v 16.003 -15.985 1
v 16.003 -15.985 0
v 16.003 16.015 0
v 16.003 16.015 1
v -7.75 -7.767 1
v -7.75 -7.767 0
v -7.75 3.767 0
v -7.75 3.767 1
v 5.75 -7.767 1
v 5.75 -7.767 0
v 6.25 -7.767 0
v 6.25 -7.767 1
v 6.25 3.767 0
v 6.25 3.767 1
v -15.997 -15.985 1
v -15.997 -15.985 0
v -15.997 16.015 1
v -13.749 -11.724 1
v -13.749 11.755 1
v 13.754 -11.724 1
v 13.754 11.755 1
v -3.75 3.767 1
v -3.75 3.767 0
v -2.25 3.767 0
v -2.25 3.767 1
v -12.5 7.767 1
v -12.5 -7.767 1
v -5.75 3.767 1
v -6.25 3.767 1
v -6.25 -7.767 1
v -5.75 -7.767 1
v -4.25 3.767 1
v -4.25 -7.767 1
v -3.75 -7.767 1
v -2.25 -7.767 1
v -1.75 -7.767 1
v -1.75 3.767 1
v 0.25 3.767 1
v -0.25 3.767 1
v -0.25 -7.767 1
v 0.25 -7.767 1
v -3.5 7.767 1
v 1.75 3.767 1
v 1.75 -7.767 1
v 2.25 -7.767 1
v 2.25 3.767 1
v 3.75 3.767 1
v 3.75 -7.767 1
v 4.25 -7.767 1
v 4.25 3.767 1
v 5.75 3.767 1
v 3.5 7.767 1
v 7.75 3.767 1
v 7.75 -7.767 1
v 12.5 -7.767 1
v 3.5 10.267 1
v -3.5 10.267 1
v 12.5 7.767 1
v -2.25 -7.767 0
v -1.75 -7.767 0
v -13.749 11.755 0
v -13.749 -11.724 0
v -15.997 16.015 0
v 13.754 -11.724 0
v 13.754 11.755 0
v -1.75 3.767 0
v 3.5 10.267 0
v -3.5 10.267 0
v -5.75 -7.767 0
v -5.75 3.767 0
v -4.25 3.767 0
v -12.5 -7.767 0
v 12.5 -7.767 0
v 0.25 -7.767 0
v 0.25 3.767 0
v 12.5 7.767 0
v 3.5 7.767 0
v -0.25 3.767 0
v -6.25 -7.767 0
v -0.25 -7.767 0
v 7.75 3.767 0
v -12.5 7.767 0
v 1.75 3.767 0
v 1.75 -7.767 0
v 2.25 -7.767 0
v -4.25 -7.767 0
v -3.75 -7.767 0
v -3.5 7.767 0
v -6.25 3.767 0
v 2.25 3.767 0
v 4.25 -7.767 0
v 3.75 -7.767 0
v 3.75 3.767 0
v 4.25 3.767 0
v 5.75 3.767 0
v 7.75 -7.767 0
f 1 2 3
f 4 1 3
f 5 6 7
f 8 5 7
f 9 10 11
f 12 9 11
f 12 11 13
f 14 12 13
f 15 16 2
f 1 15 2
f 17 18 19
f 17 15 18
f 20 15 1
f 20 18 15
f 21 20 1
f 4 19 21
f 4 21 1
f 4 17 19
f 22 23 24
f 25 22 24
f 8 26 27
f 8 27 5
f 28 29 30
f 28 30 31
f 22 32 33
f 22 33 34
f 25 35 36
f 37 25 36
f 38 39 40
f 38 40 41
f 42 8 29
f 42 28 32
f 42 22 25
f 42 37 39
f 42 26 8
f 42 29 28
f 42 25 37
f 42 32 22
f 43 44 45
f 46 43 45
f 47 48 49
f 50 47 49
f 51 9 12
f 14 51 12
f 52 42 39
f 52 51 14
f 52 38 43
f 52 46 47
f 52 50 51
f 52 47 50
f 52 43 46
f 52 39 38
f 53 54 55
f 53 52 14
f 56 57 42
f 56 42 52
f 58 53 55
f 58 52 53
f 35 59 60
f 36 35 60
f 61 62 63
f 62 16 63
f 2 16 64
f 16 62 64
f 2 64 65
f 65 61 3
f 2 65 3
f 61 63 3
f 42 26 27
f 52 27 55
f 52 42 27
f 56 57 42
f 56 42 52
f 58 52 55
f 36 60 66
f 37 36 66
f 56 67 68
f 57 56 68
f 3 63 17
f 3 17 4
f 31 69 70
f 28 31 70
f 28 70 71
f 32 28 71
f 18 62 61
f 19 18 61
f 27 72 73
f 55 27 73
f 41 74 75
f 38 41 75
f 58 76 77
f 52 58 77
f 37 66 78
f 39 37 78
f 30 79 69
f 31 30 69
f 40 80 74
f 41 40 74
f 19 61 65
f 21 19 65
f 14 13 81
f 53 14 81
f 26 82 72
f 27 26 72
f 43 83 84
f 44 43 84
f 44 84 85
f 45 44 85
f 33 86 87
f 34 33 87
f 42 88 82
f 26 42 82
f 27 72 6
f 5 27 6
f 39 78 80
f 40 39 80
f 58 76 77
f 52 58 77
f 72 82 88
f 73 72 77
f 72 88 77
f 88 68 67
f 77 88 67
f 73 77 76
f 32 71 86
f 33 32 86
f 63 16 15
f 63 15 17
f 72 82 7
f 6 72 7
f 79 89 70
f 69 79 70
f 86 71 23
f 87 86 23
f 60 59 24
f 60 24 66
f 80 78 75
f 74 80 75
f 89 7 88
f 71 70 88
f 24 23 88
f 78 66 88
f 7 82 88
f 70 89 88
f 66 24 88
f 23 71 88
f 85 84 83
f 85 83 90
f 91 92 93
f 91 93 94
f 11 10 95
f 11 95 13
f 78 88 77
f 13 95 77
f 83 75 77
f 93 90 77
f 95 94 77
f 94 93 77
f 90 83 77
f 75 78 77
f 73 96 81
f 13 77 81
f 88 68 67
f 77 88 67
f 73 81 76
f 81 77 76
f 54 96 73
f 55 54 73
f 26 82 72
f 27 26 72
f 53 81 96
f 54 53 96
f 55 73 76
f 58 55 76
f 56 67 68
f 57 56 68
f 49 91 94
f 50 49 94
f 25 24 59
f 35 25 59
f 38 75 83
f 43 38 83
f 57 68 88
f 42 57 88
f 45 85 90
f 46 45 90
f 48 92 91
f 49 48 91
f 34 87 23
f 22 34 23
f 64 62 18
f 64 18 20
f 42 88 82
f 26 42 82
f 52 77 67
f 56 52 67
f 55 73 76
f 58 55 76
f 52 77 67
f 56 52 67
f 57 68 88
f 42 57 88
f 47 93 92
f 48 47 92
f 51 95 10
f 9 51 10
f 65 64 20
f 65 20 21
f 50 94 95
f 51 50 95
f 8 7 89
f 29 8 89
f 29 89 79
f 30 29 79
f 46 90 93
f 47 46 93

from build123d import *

# Parameters (mm, degrees)
F1_DEPTH = 1
F0_W     = 32
F0_H     = 32
F0_W_2   = 27.503256
F0_H_2   = 23.47956
F2_DEPTH = 1
F0_W_3   = 1.5
F0_H_3   = 11.533698
F3_DEPTH = 1


with BuildPart() as f1:
    # F0 (on Top) → F1 (new body)
    with BuildSketch(Plane.XY):
        Polygon((9.75, -7.766849), (12.5, -7.766849), (12.5, 3.766849), (12.5, 7.766849), (3.5, 7.766849), (3.5, 10.266849), (-3.5, 10.266849), (-3.5, 7.766849), (-12.5, 7.766849), (-12.5, 3.766849), (-12.5, -7.766849), (-9.75, -7.766849), (-8.25, -7.766849), (-7.75, -7.766849), (-7.75, 3.766849), (-6.25, 3.766849), (-6.25, -7.766849), (-5.75, -7.766849), (-5.75, 3.766849), (-4.25, 3.766849), (-4.25, -7.766849), (-3.75, -7.766849), (-3.75, 3.766849), (-2.25, 3.766849), (-2.25, -7.766849), (-1.75, -7.766849), (-1.75, 3.766849), (-0.25, 3.766849), (-0.25, -7.766849), (0.25, -7.766849), (0.25, 3.766849), (1.75, 3.766849), (1.75, -7.766849), (2.25, -7.766849), (2.25, 3.766849), (3.75, 3.766849), (3.75, -7.766849), (4.25, -7.766849), (4.25, 3.766849), (5.75, 3.766849), (5.75, -7.766849), (6.25, -7.766849), (6.25, 3.766849), (7.75, 3.766849), (7.75, -7.766849), (8.25, -7.766849), align=None)
    extrude(amount=F1_DEPTH)


with BuildPart() as f2:
    # F0 (on Top) → F2 (new body)
    with BuildSketch(Plane.XY):
        with Locations((0.00265, 0.01533)):
            Rectangle(F0_W, F0_H)
        with Locations((0.00265, 0.01533)):
            Rectangle(F0_W_2, F0_H_2, mode=Mode.SUBTRACT)
    extrude(amount=F2_DEPTH)


with BuildPart() as f3:
    # F0 (on Top) → F3 (new body)
    with BuildSketch(Plane.XY):
        Polygon((9.75, -7.766849), (12.5, -7.766849), (12.5, 3.766849), (12.5, 7.766849), (3.5, 7.766849), (3.5, 10.266849), (-3.5, 10.266849), (-3.5, 7.766849), (-12.5, 7.766849), (-12.5, 3.766849), (-12.5, -7.766849), (-9.75, -7.766849), (-8.25, -7.766849), (-7.75, -7.766849), (-7.75, 3.766849), (-6.25, 3.766849), (-6.25, -7.766849), (-5.75, -7.766849), (-5.75, 3.766849), (-4.25, 3.766849), (-4.25, -7.766849), (-3.75, -7.766849), (-3.75, 3.766849), (-2.25, 3.766849), (-2.25, -7.766849), (-1.75, -7.766849), (-1.75, 3.766849), (-0.25, 3.766849), (-0.25, -7.766849), (0.25, -7.766849), (0.25, 3.766849), (1.75, 3.766849), (1.75, -7.766849), (2.25, -7.766849), (2.25, 3.766849), (3.75, 3.766849), (3.75, -7.766849), (4.25, -7.766849), (4.25, 3.766849), (5.75, 3.766849), (5.75, -7.766849), (6.25, -7.766849), (6.25, 3.766849), (7.75, 3.766849), (7.75, -7.766849), (8.25, -7.766849), align=None)
        with Locations((-7, -2)):
            Rectangle(F0_W_3, F0_H_3)
        with Locations((-5, -2)):
            Rectangle(F0_W_3, F0_H_3)
        with Locations((-3, -2)):
            Rectangle(F0_W_3, F0_H_3)
        with Locations((-1, -2)):
            Rectangle(F0_W_3, F0_H_3)
        with Locations((1, -2)):
            Rectangle(F0_W_3, F0_H_3)
        with Locations((3, -2)):
            Rectangle(F0_W_3, F0_H_3)
        with Locations((5, -2)):
            Rectangle(F0_W_3, F0_H_3)
        with Locations((7, -2)):
            Rectangle(F0_W_3, F0_H_3)
    extrude(amount=F3_DEPTH)


solid = Compound([f1.part, f2.part, f3.part])
